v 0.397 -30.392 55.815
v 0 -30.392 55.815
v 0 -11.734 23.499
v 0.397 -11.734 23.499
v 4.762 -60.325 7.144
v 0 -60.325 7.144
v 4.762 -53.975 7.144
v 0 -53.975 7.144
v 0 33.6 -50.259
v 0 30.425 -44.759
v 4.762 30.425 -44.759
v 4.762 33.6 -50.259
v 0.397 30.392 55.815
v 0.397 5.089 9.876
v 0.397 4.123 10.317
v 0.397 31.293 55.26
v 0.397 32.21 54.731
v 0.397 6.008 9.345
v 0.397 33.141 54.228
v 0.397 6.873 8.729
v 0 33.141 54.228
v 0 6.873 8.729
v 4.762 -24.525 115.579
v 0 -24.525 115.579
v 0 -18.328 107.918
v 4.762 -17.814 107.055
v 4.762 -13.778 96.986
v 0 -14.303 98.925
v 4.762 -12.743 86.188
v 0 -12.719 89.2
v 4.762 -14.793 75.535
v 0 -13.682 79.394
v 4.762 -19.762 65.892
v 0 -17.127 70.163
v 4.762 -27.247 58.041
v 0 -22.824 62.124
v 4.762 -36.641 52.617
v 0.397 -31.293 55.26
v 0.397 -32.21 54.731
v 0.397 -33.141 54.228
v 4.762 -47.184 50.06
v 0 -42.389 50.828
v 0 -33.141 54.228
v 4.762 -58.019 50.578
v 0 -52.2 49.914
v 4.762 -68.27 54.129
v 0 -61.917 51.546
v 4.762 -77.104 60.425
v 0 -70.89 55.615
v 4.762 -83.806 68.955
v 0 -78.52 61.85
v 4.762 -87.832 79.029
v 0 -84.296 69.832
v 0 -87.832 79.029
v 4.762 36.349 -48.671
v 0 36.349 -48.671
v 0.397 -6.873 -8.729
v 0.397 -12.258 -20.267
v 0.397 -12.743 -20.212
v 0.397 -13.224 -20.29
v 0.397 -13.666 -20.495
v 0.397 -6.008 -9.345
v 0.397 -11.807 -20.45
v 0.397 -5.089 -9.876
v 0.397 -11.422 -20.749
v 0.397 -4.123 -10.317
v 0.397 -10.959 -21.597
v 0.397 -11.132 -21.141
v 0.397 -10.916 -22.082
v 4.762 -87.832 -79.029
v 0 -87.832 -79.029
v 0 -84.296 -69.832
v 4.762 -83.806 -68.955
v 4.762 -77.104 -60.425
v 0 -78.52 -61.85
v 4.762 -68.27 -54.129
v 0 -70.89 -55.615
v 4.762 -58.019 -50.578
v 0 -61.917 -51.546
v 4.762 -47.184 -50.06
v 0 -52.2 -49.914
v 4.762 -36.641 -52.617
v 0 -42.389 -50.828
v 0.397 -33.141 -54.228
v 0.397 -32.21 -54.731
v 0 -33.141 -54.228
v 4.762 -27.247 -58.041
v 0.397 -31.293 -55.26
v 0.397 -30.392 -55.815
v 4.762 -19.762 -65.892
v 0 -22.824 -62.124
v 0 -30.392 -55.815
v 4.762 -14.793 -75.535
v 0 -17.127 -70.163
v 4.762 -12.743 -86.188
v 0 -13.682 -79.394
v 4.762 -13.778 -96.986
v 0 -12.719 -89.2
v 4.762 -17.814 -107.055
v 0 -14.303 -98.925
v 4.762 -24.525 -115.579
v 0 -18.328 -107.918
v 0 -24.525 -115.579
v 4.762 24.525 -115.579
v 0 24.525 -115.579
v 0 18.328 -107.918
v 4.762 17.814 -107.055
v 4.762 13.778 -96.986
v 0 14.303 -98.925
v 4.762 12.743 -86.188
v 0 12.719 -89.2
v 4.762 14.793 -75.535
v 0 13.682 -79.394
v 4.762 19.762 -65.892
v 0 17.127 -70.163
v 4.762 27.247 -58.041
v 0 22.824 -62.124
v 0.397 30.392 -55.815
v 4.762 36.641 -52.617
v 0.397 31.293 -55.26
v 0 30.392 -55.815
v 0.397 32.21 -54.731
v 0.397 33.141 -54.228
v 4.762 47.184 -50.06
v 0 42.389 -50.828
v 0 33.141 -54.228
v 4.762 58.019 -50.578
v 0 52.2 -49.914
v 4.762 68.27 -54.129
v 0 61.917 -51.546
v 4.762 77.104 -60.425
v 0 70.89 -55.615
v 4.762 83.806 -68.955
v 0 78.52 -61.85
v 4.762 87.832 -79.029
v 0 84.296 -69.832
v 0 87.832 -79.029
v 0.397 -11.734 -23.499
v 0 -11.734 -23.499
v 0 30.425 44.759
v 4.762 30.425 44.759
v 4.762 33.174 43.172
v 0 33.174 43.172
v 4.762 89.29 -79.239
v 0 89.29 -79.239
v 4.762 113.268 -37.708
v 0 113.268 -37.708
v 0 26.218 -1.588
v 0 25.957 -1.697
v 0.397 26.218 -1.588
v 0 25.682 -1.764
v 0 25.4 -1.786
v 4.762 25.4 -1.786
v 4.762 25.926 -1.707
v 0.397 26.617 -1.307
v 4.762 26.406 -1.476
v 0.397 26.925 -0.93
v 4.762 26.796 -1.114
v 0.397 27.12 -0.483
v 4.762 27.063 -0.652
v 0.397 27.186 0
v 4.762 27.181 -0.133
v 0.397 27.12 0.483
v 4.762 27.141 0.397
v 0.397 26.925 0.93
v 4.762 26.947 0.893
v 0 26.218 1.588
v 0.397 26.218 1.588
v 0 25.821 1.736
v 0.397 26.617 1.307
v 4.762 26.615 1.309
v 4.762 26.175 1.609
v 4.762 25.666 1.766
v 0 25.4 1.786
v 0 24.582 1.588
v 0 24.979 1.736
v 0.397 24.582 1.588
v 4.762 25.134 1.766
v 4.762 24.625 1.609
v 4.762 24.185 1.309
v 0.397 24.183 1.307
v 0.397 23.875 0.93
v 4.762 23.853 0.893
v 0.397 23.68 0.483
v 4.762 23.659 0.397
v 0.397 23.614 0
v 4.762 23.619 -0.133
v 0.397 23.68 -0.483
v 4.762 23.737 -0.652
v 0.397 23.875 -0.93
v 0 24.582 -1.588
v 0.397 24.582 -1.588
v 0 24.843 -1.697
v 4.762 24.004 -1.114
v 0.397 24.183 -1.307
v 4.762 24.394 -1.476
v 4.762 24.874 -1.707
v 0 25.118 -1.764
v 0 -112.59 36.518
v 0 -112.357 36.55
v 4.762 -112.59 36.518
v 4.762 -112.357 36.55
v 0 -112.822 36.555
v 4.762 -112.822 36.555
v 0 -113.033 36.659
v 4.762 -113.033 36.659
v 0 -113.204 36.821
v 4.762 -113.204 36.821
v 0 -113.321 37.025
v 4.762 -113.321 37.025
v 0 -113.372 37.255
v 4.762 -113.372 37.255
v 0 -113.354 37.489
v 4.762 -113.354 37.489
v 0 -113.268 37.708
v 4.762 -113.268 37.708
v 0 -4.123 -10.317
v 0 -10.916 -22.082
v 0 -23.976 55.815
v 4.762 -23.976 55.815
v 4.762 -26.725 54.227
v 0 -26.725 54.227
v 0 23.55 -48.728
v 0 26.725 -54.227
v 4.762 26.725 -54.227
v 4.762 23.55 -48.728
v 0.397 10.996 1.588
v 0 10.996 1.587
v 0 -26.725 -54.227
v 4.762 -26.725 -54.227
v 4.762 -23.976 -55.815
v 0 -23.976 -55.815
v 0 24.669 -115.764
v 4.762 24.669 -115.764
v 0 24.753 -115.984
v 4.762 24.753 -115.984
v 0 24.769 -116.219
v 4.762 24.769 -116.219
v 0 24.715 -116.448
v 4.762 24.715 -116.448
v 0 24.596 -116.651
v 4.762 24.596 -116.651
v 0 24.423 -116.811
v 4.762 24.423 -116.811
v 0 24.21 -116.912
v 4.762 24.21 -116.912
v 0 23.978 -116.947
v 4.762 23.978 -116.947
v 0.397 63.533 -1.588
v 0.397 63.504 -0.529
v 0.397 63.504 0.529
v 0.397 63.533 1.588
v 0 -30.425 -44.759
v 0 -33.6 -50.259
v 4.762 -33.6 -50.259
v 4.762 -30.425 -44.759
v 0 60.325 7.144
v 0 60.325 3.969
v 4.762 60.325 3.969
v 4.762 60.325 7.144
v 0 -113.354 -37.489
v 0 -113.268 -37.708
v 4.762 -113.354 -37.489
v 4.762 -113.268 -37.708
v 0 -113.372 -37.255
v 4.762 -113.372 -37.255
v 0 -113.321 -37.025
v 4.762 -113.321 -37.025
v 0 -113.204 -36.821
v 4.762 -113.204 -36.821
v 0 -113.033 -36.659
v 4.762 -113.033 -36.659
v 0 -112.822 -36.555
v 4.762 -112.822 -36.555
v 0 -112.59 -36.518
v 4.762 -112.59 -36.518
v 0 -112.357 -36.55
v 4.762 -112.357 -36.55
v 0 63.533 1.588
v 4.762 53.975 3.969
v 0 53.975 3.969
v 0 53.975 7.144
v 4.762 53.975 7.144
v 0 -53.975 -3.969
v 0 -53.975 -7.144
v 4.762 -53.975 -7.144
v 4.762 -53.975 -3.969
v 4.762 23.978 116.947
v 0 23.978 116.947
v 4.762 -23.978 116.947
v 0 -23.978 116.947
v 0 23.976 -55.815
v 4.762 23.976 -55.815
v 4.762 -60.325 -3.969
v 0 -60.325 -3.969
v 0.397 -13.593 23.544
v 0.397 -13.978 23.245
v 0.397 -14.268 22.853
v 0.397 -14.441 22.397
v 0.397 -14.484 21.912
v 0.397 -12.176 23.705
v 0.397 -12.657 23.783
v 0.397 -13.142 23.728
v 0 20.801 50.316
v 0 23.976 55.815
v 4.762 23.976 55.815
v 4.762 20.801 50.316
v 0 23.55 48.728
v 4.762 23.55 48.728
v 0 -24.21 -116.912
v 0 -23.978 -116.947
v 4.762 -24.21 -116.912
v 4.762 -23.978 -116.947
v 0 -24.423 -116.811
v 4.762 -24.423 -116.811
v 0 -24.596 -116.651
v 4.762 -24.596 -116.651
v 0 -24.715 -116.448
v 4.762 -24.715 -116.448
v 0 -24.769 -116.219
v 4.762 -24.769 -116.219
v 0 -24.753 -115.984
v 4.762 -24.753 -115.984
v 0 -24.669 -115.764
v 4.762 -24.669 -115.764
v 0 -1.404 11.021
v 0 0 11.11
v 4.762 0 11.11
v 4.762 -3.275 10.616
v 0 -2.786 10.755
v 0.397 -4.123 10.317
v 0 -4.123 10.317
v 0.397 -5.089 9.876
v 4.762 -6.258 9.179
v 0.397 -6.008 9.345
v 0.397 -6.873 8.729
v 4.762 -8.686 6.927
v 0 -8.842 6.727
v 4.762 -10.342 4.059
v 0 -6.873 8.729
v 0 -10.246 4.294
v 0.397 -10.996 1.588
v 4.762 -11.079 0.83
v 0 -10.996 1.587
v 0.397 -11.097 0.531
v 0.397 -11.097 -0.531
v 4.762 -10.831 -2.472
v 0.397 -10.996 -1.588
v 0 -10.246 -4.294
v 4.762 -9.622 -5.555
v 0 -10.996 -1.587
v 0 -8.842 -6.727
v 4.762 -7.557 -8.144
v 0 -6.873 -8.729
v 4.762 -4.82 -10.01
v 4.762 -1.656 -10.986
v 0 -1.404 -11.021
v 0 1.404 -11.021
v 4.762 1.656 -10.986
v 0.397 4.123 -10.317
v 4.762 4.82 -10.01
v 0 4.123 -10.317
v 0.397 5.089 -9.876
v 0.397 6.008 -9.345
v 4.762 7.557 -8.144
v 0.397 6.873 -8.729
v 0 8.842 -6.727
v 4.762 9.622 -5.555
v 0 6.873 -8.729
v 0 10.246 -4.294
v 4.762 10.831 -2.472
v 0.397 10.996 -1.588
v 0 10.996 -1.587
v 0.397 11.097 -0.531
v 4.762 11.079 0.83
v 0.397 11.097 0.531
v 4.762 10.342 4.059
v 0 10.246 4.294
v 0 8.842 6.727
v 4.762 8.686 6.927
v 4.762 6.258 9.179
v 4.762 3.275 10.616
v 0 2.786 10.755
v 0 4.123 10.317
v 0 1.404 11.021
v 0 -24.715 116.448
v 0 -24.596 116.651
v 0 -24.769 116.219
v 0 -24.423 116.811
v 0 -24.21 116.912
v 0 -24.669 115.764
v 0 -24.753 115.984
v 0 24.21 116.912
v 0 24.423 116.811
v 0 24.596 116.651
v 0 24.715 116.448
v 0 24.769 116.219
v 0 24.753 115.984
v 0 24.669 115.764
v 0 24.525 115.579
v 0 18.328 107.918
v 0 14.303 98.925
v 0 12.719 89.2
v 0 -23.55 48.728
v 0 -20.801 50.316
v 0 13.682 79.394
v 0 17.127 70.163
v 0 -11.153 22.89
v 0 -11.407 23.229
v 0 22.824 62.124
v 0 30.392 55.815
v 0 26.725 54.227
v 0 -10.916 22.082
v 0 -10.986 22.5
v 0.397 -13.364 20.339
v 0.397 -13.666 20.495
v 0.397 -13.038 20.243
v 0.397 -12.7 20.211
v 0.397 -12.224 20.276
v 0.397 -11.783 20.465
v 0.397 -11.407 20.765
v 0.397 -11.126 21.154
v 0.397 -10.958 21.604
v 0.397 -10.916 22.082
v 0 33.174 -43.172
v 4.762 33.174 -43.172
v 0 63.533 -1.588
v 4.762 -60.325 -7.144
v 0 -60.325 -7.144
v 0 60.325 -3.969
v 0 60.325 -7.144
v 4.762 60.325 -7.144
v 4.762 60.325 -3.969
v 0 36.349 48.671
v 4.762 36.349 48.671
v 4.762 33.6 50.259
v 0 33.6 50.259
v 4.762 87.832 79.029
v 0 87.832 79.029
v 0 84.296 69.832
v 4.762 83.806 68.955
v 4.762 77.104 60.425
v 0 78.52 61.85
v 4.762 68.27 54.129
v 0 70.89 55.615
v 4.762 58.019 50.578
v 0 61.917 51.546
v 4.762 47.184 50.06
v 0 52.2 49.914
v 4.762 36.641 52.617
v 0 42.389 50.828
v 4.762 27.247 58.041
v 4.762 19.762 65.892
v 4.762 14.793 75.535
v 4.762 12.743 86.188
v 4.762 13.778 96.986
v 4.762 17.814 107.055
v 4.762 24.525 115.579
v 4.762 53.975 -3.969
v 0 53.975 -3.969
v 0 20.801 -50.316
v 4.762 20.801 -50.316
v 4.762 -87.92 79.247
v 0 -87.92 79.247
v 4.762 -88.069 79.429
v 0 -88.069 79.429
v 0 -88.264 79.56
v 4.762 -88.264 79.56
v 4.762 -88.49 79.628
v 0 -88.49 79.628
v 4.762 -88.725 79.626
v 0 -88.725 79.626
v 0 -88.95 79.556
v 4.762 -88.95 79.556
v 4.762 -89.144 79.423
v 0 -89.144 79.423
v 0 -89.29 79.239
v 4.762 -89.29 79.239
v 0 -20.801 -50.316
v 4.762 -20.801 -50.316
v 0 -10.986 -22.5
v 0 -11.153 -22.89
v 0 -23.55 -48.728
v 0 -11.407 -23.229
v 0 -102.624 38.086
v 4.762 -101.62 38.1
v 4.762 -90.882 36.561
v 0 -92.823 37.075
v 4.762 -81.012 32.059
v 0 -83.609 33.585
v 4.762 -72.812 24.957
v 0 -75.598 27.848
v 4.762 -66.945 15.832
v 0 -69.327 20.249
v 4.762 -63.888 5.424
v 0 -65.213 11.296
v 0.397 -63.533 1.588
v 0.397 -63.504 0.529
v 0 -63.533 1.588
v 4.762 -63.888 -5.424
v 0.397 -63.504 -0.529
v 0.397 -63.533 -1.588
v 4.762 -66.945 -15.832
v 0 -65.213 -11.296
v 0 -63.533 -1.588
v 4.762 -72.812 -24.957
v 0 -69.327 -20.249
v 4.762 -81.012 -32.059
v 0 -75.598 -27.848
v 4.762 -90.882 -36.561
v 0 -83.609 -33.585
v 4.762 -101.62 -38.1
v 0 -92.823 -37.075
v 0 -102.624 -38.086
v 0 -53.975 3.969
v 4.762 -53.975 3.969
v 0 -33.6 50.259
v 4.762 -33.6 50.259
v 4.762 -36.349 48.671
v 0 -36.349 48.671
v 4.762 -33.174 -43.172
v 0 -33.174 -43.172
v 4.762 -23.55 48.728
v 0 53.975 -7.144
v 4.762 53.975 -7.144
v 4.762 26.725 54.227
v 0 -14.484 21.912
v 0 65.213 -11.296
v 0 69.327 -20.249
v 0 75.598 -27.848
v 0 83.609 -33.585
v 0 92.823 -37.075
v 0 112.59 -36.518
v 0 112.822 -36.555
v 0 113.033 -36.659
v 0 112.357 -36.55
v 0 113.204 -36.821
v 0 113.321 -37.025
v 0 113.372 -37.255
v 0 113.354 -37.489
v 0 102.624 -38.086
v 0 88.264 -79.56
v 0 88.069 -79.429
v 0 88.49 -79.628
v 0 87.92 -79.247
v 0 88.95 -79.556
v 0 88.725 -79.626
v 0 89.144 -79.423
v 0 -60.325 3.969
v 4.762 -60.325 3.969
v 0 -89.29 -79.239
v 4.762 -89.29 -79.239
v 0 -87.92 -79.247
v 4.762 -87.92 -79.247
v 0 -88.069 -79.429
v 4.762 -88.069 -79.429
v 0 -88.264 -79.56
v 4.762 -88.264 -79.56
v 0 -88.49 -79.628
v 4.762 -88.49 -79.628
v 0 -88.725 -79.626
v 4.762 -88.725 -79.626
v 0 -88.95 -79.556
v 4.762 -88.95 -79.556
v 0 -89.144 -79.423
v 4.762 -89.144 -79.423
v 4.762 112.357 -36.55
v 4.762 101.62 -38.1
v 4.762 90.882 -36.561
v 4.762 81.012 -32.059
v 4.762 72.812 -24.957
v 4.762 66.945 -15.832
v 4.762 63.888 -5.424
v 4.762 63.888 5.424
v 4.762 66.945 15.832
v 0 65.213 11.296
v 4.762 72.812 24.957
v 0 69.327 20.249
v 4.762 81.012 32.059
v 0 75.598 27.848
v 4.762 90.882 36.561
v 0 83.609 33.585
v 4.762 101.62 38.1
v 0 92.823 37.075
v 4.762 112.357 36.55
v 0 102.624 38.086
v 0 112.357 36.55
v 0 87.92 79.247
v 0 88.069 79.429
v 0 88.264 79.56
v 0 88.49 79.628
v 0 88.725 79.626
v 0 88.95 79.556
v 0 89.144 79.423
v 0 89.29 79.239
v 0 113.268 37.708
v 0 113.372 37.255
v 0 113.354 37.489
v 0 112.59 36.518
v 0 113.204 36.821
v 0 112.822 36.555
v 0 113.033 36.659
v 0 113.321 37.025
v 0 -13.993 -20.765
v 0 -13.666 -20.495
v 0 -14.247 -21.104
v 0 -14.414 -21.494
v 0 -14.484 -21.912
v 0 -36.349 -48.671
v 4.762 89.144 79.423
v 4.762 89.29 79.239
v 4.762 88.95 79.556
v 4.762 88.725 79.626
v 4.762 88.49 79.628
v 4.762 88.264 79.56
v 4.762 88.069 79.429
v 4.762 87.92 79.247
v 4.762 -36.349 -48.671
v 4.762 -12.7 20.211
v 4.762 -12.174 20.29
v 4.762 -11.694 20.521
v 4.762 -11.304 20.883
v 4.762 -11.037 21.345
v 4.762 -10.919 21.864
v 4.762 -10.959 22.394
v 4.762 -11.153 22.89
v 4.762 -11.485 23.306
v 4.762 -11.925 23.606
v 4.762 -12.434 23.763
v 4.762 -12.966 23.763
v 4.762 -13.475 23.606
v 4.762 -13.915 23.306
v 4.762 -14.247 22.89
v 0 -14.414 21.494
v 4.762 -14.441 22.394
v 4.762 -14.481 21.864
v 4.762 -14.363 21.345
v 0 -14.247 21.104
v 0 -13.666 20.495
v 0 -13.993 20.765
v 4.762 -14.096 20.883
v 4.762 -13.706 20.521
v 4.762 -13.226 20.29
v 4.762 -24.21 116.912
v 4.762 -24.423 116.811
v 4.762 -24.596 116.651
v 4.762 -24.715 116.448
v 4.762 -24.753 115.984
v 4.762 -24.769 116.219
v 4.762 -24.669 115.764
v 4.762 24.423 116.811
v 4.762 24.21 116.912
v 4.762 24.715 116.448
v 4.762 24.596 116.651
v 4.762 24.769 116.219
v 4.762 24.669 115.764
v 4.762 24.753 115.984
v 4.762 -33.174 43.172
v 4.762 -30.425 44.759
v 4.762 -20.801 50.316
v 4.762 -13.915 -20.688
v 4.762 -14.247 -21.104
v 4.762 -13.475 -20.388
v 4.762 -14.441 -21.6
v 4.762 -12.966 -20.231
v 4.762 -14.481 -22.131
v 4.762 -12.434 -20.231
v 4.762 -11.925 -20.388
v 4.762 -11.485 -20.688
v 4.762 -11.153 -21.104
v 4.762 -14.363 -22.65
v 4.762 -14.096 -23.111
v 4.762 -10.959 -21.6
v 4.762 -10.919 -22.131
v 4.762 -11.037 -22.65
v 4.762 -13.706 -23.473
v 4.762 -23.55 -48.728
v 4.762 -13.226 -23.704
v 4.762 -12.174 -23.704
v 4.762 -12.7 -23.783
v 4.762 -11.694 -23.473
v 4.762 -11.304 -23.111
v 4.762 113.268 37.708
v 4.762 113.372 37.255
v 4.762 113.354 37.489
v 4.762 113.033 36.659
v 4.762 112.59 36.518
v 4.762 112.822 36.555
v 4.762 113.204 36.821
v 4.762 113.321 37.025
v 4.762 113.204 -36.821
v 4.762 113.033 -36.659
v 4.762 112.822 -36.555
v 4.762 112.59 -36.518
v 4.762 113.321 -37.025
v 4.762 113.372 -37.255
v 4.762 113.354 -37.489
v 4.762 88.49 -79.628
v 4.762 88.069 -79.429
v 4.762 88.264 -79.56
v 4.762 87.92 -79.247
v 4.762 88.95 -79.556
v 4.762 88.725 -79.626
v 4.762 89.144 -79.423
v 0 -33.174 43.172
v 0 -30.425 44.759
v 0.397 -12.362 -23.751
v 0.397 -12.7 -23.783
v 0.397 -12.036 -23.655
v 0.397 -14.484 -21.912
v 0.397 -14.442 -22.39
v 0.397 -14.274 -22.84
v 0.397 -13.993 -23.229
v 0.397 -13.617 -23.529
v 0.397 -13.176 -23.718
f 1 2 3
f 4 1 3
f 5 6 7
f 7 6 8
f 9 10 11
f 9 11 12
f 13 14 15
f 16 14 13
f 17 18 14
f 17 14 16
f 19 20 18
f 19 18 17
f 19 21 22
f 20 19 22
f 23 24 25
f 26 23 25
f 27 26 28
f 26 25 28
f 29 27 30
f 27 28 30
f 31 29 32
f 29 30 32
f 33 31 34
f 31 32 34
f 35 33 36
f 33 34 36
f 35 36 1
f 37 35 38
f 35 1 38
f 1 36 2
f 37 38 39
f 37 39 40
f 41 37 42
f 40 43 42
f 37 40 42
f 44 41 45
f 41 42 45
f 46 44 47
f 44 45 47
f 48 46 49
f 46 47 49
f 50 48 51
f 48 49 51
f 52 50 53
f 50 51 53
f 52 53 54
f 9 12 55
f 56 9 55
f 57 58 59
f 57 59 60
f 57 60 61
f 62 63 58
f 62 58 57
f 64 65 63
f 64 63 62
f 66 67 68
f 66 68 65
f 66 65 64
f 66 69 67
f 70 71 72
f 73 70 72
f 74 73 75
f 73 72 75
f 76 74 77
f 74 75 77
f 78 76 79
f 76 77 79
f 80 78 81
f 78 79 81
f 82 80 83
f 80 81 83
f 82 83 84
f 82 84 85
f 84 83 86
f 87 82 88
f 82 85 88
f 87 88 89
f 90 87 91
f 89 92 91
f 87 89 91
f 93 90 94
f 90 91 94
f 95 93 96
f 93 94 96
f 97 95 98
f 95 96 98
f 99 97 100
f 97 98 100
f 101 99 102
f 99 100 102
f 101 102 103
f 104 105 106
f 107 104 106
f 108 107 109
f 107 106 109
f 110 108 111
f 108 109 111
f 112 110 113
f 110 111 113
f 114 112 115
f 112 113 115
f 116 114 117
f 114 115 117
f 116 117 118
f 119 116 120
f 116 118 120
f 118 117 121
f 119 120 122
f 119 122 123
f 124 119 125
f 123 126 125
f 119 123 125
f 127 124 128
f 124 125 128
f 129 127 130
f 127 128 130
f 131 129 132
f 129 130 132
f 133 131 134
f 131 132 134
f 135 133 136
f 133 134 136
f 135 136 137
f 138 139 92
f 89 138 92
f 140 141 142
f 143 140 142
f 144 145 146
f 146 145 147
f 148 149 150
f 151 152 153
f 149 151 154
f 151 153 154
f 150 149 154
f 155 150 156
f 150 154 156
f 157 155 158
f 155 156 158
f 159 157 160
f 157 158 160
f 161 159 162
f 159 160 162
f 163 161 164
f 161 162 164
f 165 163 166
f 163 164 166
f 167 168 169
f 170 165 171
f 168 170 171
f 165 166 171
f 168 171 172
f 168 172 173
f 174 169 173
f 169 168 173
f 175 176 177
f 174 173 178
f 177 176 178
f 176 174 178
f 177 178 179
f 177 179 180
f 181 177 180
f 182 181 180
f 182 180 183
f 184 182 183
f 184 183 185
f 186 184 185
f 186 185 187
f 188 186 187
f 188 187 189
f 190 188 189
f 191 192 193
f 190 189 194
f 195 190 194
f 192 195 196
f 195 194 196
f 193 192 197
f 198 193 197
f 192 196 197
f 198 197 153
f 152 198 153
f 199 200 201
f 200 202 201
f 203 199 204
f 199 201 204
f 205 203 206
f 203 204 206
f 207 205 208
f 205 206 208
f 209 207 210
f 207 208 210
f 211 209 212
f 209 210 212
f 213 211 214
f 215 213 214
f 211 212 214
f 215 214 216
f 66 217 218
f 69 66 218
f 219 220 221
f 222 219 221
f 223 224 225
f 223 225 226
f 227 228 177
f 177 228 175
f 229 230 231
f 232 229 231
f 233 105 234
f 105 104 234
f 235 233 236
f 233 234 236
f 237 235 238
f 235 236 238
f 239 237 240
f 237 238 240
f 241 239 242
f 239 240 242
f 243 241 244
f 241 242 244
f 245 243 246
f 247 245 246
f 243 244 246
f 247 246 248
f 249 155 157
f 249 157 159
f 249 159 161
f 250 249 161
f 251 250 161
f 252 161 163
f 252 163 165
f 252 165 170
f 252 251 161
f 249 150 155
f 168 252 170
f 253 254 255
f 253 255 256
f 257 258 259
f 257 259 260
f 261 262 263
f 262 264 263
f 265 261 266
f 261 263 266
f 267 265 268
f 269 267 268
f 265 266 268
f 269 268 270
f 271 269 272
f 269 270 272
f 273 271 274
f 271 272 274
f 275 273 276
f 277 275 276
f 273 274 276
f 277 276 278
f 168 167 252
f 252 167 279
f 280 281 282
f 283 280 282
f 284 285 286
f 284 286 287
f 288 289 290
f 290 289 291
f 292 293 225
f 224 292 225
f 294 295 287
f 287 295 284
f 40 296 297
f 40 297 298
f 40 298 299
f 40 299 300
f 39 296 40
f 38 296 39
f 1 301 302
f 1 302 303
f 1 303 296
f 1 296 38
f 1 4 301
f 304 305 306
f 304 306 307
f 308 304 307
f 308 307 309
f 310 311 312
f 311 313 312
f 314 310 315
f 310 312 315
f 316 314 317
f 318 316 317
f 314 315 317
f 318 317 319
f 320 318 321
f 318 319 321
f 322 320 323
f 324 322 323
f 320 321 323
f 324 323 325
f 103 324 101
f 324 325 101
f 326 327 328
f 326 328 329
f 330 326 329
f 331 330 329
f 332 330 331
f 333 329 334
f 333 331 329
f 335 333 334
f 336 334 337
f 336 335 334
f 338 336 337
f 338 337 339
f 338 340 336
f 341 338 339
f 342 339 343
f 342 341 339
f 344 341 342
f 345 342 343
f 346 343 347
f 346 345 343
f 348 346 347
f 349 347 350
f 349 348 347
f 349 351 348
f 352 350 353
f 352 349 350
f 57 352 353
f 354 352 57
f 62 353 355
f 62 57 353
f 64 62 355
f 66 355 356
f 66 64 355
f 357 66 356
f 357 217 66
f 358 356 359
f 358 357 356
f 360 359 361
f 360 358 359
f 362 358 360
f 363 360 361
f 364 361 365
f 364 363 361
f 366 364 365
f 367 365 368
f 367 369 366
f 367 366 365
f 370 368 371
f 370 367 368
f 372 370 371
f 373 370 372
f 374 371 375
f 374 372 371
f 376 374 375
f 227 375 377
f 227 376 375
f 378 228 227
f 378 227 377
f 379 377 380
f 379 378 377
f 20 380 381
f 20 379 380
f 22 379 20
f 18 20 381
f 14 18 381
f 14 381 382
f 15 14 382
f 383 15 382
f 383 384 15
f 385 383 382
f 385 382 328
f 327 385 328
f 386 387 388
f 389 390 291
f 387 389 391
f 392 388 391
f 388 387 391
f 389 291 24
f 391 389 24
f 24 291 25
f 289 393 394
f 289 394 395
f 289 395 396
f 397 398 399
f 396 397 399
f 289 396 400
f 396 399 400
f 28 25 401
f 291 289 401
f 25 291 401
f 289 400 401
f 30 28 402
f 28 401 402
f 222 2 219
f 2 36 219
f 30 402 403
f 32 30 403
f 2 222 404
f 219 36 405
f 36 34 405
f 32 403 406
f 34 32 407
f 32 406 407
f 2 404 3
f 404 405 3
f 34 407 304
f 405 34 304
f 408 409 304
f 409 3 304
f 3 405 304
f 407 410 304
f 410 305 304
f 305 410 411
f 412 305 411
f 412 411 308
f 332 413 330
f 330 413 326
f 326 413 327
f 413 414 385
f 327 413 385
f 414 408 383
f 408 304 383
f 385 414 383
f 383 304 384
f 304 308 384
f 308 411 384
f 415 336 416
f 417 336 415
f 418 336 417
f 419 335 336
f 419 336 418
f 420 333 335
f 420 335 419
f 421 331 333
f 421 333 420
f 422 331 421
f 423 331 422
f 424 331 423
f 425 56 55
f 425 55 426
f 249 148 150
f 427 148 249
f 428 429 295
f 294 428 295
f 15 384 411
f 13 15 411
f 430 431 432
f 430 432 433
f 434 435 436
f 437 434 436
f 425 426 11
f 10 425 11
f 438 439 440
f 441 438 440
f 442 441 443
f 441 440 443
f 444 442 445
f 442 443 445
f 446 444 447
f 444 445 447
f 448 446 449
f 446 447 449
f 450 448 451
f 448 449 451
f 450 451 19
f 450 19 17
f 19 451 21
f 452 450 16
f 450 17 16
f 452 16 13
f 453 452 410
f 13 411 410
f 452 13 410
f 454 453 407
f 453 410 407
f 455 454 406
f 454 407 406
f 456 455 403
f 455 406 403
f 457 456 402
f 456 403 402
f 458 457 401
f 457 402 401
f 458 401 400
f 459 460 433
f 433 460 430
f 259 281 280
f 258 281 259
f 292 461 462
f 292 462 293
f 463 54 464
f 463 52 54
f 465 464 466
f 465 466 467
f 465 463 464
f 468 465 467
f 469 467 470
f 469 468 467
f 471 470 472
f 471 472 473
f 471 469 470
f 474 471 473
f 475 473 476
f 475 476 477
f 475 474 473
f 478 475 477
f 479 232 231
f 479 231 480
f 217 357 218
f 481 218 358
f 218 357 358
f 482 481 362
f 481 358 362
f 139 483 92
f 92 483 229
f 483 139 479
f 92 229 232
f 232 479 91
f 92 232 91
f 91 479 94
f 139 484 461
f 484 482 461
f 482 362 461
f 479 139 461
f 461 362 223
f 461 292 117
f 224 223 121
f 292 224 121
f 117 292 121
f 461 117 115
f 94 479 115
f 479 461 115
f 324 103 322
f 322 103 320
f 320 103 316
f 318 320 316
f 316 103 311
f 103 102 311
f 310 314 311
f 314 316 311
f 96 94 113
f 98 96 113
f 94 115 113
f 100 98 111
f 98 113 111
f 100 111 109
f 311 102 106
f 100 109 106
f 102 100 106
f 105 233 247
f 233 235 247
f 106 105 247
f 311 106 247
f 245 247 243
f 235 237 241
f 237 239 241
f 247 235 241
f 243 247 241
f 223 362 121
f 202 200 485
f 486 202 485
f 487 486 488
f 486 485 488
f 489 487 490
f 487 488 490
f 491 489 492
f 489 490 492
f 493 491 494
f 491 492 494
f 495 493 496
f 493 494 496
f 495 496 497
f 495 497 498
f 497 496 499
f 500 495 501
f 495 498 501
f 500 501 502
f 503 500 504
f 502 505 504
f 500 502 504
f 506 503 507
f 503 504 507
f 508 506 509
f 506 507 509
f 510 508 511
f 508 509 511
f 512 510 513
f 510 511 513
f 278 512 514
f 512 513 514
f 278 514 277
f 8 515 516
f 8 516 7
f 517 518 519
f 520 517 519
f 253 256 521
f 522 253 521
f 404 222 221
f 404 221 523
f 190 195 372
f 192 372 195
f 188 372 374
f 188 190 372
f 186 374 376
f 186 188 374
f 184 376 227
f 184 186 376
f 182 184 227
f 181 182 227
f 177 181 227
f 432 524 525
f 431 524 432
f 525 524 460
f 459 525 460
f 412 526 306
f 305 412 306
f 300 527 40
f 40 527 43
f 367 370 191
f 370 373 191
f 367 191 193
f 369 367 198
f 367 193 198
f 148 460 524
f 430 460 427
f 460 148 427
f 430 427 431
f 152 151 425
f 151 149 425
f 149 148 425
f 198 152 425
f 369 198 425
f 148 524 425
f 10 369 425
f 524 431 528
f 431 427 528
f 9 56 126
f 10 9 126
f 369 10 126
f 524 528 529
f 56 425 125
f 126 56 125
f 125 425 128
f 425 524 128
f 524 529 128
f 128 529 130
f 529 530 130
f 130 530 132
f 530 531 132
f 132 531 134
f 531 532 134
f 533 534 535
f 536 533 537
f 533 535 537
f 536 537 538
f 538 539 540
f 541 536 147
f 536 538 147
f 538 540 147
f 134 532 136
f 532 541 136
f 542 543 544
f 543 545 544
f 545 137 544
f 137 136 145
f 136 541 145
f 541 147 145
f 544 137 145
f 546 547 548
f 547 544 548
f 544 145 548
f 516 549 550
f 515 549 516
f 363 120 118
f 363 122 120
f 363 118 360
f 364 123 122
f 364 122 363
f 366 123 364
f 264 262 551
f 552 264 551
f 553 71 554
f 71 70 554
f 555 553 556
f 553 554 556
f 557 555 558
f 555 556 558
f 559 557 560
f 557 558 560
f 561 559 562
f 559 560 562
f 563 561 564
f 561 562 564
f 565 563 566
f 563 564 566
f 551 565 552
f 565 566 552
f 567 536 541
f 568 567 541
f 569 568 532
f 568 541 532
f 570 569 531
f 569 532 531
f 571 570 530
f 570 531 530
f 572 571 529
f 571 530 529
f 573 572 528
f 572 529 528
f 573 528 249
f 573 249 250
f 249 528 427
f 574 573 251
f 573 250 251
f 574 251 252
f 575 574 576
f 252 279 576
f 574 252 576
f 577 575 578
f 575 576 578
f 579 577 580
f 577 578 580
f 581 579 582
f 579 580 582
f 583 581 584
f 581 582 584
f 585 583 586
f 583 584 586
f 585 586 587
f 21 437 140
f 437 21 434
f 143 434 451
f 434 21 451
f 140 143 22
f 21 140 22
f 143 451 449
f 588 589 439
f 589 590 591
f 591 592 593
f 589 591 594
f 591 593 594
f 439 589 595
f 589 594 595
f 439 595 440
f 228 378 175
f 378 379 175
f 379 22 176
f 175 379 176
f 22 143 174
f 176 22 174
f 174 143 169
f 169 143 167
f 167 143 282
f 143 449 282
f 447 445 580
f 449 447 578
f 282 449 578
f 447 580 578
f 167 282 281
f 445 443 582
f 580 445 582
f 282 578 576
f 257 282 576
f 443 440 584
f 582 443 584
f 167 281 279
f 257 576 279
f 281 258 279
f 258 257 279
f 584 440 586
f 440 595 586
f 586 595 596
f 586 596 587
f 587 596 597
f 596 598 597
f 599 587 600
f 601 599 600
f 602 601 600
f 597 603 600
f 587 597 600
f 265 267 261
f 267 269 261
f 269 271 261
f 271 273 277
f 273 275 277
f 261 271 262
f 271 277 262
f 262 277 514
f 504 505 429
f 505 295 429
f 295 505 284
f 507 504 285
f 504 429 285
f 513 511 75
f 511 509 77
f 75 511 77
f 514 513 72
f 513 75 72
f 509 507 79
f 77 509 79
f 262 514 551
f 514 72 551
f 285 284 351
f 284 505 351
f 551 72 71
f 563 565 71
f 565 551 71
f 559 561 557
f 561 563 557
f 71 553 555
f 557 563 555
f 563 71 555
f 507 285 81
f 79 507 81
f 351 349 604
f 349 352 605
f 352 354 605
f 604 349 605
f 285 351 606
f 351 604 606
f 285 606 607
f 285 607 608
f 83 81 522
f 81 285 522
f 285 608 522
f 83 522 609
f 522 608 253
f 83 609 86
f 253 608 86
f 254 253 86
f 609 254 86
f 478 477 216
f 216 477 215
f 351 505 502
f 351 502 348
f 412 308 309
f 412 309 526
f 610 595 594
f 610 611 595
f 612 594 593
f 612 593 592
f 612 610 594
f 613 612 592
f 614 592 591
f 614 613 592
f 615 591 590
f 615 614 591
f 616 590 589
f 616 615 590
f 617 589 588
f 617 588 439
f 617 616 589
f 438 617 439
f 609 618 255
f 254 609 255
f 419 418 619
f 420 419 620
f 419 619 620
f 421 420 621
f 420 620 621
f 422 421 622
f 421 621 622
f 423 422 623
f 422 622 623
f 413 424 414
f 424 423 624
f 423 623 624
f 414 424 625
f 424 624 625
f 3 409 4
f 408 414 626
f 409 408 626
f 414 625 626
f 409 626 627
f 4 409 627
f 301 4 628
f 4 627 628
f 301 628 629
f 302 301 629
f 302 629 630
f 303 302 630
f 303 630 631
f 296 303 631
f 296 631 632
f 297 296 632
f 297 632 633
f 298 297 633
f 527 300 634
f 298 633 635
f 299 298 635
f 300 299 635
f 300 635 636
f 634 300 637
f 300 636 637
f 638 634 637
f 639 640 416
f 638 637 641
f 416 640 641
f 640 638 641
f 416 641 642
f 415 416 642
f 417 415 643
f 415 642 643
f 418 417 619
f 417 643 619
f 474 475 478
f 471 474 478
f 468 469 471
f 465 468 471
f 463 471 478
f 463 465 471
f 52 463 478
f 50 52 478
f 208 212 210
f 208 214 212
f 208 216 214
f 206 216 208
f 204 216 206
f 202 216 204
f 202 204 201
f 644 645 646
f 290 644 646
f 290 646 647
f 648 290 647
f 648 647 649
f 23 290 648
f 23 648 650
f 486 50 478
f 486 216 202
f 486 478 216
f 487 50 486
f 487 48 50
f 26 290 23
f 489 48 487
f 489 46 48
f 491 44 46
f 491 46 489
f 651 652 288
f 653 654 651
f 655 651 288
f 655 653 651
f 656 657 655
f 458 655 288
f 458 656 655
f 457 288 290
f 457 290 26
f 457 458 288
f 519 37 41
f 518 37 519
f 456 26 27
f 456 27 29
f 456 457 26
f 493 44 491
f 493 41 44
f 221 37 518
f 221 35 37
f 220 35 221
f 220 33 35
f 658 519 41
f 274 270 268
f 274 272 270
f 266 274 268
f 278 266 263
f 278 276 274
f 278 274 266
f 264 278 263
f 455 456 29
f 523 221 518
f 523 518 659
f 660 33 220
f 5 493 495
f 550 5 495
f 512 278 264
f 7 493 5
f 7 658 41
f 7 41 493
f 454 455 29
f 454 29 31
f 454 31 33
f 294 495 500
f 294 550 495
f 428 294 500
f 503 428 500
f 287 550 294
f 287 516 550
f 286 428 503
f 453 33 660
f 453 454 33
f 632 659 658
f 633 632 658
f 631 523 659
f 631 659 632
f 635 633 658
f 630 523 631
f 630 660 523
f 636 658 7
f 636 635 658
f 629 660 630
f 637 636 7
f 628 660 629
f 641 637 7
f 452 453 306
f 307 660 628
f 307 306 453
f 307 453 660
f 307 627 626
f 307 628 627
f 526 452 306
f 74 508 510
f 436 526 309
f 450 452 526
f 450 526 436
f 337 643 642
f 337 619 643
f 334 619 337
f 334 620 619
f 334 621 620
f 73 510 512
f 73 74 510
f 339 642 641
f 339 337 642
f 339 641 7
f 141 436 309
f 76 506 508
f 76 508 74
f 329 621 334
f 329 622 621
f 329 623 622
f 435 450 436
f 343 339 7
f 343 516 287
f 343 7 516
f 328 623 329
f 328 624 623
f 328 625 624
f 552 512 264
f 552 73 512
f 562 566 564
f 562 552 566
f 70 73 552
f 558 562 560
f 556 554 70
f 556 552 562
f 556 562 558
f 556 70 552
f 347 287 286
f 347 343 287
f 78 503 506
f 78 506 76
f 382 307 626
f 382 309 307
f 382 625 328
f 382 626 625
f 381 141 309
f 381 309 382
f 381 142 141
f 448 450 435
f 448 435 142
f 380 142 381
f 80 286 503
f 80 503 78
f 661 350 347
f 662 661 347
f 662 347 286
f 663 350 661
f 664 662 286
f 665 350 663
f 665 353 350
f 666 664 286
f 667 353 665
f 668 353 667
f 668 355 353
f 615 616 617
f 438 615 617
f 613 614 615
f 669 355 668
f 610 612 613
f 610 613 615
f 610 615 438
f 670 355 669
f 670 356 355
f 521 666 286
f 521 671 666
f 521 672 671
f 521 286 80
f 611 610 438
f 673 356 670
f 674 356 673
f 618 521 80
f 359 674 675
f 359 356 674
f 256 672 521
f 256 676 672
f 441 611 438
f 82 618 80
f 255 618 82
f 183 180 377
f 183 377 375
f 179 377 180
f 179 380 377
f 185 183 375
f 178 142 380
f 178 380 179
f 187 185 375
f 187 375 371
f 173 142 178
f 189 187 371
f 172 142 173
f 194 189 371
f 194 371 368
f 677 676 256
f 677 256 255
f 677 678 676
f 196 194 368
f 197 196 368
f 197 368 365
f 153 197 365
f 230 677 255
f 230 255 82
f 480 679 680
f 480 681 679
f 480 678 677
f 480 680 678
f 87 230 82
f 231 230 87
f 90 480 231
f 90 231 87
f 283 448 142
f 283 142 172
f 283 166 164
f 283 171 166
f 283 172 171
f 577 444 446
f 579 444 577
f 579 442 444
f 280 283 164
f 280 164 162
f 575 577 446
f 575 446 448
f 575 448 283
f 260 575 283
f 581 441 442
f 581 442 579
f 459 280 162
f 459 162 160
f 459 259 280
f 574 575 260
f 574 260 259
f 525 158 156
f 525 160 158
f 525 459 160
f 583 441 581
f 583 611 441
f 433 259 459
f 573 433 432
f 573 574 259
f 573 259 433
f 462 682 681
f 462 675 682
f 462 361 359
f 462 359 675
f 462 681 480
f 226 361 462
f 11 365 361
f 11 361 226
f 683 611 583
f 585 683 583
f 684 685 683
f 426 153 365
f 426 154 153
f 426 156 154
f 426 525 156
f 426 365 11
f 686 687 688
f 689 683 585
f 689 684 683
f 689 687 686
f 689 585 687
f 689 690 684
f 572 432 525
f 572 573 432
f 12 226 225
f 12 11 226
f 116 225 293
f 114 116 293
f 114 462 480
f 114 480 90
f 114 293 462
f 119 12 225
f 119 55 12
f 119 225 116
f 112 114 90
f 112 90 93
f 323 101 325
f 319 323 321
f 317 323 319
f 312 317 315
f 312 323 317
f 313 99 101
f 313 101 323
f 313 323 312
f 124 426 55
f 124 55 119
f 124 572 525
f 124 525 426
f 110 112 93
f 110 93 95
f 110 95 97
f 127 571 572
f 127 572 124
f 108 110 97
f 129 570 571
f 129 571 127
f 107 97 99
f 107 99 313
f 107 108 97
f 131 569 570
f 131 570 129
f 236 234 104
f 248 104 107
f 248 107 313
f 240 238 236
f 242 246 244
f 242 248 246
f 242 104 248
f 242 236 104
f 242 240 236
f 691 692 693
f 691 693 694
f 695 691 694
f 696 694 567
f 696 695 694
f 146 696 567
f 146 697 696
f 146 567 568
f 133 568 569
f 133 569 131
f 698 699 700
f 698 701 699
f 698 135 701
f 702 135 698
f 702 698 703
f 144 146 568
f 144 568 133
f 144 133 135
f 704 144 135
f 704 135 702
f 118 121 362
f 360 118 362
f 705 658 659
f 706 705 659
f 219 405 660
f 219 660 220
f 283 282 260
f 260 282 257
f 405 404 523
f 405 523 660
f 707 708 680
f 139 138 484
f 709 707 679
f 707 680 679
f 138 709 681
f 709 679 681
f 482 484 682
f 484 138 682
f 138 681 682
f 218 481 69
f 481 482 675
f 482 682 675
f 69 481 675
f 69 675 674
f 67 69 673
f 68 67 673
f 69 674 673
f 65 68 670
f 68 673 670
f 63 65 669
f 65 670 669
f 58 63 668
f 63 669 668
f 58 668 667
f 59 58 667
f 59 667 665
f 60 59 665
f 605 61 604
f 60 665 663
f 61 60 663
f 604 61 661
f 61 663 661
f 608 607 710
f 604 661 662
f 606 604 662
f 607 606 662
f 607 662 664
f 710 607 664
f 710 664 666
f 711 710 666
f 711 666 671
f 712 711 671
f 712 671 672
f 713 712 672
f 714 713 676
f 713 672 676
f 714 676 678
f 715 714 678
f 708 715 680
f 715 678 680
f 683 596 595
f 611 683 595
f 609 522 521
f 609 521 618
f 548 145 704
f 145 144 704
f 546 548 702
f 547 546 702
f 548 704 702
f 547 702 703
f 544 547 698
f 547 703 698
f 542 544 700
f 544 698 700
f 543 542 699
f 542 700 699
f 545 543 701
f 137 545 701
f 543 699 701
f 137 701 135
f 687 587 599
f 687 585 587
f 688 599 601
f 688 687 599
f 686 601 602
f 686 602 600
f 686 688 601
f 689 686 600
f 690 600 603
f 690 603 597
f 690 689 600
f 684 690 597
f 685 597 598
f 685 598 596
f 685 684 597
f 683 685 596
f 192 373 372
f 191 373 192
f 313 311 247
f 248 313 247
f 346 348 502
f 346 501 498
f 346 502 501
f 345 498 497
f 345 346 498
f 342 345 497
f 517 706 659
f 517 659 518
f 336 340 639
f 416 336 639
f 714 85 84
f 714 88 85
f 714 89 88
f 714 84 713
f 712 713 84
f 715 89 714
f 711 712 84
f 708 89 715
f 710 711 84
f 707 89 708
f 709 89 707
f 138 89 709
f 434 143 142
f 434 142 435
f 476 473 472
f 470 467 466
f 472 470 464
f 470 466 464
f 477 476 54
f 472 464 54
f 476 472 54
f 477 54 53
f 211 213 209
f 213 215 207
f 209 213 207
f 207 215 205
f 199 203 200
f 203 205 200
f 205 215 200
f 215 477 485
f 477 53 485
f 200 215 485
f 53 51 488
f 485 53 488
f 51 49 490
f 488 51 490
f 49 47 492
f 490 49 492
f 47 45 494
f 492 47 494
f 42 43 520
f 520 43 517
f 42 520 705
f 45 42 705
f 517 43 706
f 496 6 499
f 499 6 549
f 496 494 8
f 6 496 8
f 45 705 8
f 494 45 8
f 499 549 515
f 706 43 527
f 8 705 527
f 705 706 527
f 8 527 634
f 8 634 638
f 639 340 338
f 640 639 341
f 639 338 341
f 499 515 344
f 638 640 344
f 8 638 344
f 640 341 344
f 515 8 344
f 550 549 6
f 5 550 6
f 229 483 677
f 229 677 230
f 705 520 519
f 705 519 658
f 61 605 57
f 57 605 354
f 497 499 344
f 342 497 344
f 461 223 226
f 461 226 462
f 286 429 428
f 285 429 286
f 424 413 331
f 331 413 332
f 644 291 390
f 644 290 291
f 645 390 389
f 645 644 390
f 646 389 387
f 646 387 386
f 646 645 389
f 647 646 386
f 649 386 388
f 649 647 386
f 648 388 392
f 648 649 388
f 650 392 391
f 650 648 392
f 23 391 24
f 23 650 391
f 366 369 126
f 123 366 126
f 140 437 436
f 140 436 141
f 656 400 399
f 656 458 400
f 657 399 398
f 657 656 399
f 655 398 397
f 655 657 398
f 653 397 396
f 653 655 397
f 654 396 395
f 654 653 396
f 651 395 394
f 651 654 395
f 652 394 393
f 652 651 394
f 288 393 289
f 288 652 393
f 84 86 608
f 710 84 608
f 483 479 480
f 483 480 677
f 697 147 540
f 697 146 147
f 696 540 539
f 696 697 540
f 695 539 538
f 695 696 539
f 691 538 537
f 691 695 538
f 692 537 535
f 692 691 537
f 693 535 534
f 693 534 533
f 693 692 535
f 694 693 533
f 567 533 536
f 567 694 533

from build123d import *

# Parameters (mm, degrees)
SKETCH2_R                       = 11.10996
BOSS_EXTRUDE1_DEPTH             = 4.7625
SKETCH3_W                       = 3.175
SKETCH3_H                       = 181.991160274
CUT_EXTRUDE1_DEPTH              = 0.396875
FILLET1_R                       = 0.79375
F_9_64_0_14063_DIAMETER_HOLE1_D = 3.572002
SKETCH8_W                       = 3.175
SKETCH8_H                       = 6.35
CUT_EXTRUDE2_DEPTH              = 163.951186269


with BuildPart() as part:
    # Sketch2 → Boss-Extrude1 (new body)
    with BuildSketch(Plane(origin=(0, 0, 0), x_dir=(0, 0, -1), z_dir=(1, 0, 0))):
        with BuildLine():
            Line((81.02619141, 88.258519733), (35.921024484, 114.3))
            ThreePointArc((35.921024484, 114.3), (0, 63.5), (-35.921024484, 114.3))
            Line((-35.921024484, 114.3), (-81.02619141, 88.258519733))
            ThreePointArc((-81.02619141, 88.258519733), (-54.99261314, 31.75), (-116.947215895, 26.041480267))
            Line((-116.947215895, 26.041480267), (-116.947215895, -26.041480267))
            ThreePointArc((-116.947215895, -26.041480267), (-54.99261314, -31.75), (-81.02619141, -88.258519733))
            Line((-81.02619141, -88.258519733), (-35.921024484, -114.3))
            ThreePointArc((-35.921024484, -114.3), (0, -63.5), (35.921024484, -114.3))
            Line((35.921024484, -114.3), (81.02619141, -88.258519733))
            ThreePointArc((81.02619141, -88.258519733), (54.99261314, -31.75), (116.947215895, -26.041480267))
            Line((116.947215895, -26.041480267), (116.947215895, 26.041480267))
            ThreePointArc((116.947215895, 26.041480267), (54.99261314, 31.75), (81.02619141, 88.258519733))
        make_face()
        with Locations(Location((0, 0, 0), (0, 0, 180))):
            Circle(SKETCH2_R, mode=Mode.SUBTRACT)
    extrude(amount=BOSS_EXTRUDE1_DEPTH)

    # Sketch3 → Cut-Extrude1 (cut)
    with BuildSketch(Plane.ZY):
        with Locations((0, 101.6)):
            Rectangle(SKETCH3_W, SKETCH3_H)
        Polygon((167.586415056, 94.92297474), (165.998915056, 97.672605397), (8.389946993, 6.67702526), (9.977446993, 3.927394603), align=None)
        Polygon((165.998915056, -97.672605397), (167.586415056, -94.92297474), (9.977446993, -3.927394603), (8.389946993, -6.67702526), align=None)
        with Locations((0, -101.6)):
            Rectangle(SKETCH3_W, SKETCH3_H)
        Polygon((-167.586415056, -94.92297474), (-165.998915056, -97.672605397), (-8.389946993, -6.67702526), (-9.977446993, -3.927394603), align=None)
        Polygon((-165.998915056, 97.672605397), (-167.586415056, 94.92297474), (-9.977446993, 3.927394603), (-8.389946993, 6.67702526), align=None)
    extrude(amount=-CUT_EXTRUDE1_DEPTH, mode=Mode.SUBTRACT)

    # Fillet1
    fillet1_edges = [part.edges().sort_by_distance(p)[0] for p in [
        (2.38125, 88.258519733, 81.02619141),
        (2.38125, 114.3, 35.921024484),
        (2.38125, 114.3, -35.921024484),
        (2.38125, 88.258519733, -81.02619141),
        (2.38125, 26.041480267, -116.947215895),
        (2.38125, -26.041480267, -116.947215895),
        (2.38125, -88.258519733, -81.02619141),
        (2.38125, -114.3, -35.921024484),
        (2.38125, -114.3, 35.921024484),
        (2.38125, -88.258519733, 81.02619141),
        (2.38125, -26.041480267, 116.947215895),
        (2.38125, 26.041480267, 116.947215895),
    ]]
    fillet(fillet1_edges, radius=FILLET1_R)

    # 9/64 (0.14063) Diameter Hole1 (through all)
    with Locations(Plane.ZY):
        with Locations((0, 25.4), (21.997045256, -12.7), (-21.997045256, -12.7)):
            Hole(F_9_64_0_14063_DIAMETER_HOLE1_D / 2)

    # Sketch8 → Cut-Extrude2 (cut, through all)
    with BuildSketch(Plane.ZY):
        with Locations((5.55625, 57.15)):
            Rectangle(SKETCH8_W, SKETCH8_H)
        with Locations((-5.55625, 57.15)):
            Rectangle(SKETCH8_W, SKETCH8_H)
        Polygon((44.759346169, 30.424538321), (43.171846169, 33.174168978), (48.671107483, 36.349168978), (50.258607483, 33.599538321), align=None)
        Polygon((54.227357483, 26.725461679), (55.814857483, 23.975831022), (50.315596169, 20.800831022), (48.728096169, 23.550461679), align=None)
        Polygon((48.728096169, -23.550461679), (50.315596169, -20.800831022), (55.814857483, -23.975831022), (54.227357483, -26.725461679), align=None)
        Polygon((50.258607483, -33.599538321), (48.671107483, -36.349168978), (43.171846169, -33.174168978), (44.759346169, -30.424538321), align=None)
        with Locations((5.55625, -57.15)):
            Rectangle(SKETCH8_W, SKETCH8_H)
        with Locations((-5.55625, -57.15)):
            Rectangle(SKETCH8_W, SKETCH8_H)
        Polygon((-44.759346169, -30.424538321), (-43.171846169, -33.174168978), (-48.671107483, -36.349168978), (-50.258607483, -33.599538321), align=None)
        Polygon((-54.227357483, -26.725461679), (-55.814857483, -23.975831022), (-50.315596169, -20.800831022), (-48.728096169, -23.550461679), align=None)
        Polygon((-48.728096169, 23.550461679), (-50.315596169, 20.800831022), (-55.814857483, 23.975831022), (-54.227357483, 26.725461679), align=None)
        Polygon((-50.258607483, 33.599538321), (-48.671107483, 36.349168978), (-43.171846169, 33.174168978), (-44.759346169, 30.424538321), align=None)
    extrude(amount=-CUT_EXTRUDE2_DEPTH, mode=Mode.SUBTRACT)


solid = part.part
